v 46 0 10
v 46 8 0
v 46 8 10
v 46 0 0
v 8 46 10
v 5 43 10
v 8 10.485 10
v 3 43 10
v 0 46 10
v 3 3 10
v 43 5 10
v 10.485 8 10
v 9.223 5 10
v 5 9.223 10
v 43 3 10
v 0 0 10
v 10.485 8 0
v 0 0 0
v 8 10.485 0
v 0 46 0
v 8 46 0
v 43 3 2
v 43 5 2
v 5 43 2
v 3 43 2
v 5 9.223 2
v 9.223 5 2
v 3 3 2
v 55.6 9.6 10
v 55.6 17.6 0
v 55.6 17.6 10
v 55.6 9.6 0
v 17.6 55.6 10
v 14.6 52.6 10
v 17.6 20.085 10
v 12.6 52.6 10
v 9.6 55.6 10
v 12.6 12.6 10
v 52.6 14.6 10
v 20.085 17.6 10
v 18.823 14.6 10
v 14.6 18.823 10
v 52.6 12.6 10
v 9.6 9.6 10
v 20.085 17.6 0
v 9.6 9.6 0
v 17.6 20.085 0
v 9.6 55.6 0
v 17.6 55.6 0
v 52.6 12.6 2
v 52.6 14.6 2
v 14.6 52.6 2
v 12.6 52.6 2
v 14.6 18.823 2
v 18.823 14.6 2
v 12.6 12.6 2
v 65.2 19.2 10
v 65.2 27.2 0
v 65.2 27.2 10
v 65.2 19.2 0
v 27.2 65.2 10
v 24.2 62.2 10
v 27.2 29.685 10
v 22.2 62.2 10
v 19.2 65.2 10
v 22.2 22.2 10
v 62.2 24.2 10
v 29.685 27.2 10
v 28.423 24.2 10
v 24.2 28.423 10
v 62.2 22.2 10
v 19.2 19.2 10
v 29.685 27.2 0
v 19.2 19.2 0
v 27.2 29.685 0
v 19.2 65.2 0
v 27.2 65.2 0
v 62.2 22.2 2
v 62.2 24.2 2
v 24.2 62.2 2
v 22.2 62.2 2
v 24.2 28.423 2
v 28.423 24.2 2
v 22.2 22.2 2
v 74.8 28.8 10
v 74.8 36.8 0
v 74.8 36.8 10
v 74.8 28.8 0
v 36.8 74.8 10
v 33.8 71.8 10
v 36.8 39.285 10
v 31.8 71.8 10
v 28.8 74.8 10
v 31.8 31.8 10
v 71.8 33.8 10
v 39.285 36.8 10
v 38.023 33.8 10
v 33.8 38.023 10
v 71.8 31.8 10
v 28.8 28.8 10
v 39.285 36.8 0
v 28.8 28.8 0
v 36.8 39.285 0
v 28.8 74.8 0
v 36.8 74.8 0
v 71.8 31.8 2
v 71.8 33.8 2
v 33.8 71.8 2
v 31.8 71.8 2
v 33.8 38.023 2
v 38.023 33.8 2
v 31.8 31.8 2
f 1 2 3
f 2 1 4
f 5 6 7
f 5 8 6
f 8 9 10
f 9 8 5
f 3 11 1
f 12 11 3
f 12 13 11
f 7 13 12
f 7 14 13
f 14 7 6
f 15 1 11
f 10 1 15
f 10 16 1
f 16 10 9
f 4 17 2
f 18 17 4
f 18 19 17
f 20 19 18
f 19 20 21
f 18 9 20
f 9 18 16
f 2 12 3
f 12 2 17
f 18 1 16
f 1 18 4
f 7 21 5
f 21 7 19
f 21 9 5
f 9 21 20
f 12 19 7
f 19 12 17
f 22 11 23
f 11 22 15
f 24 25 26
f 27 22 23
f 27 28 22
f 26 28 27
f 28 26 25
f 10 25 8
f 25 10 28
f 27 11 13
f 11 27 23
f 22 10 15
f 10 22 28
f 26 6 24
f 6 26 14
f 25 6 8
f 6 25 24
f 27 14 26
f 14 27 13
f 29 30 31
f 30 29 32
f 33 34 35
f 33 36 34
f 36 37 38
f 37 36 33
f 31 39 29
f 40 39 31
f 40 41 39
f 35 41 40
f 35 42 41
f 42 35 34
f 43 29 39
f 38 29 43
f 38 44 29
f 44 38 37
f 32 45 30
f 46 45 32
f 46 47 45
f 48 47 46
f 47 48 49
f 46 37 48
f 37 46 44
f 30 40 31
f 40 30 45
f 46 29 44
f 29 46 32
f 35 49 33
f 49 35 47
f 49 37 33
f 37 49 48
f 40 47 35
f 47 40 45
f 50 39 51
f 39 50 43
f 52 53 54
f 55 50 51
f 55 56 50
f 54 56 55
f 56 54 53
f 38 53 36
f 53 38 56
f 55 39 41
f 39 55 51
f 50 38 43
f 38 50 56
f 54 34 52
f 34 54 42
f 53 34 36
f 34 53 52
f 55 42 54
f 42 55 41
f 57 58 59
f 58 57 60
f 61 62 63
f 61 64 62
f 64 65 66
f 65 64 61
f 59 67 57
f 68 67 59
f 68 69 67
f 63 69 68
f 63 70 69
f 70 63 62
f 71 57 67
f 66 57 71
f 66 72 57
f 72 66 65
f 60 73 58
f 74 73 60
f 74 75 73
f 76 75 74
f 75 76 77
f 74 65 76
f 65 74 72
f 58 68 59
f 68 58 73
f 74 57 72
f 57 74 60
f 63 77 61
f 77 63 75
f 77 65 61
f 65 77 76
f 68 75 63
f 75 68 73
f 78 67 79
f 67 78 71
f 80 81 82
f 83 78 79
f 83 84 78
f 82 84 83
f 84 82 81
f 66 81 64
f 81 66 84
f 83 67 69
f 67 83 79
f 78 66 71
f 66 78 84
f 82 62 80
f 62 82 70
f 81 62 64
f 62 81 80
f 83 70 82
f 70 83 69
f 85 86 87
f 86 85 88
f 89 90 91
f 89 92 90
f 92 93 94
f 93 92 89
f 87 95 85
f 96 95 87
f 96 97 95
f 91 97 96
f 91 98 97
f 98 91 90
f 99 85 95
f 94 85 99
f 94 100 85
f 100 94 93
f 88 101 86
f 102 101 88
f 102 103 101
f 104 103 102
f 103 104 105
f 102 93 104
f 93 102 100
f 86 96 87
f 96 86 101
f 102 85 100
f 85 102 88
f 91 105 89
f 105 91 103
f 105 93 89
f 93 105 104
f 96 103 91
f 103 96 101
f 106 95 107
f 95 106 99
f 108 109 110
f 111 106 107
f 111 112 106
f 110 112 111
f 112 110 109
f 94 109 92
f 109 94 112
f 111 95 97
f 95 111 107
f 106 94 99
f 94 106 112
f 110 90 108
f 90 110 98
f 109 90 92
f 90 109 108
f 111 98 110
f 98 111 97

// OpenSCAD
// ********************************************************
// Edsal Shelf Feet by jcantalupo
// remix by Peter Holzwarth
// ********************************************************

// Length of each leg of the L
L = 40;   // [5:150]

// Thickness of the leg slot
T = 2;    // [1:40]

// Number of feet to print
count= 4; // [1:8]

// Thickness of Bottom
B = 2;    // [2:10]

// Total Height of the foot
H = 10;   // [4:40]

// Thickness of the feet
th=3; // [2:10]

W = T+2*th;
s = L + W - T;

for (a=[1:count]) {
    translate([(a-1)*W*1.2,(a-1)*W*1.2,0]) shelfFoot();
}

module shelfFoot() {
    c= sqrt(2*th*th);
    echo (c);
    difference() {
        union() {
            cube([s,W,H]);
            cube([W,s,H]);
            translate([th+T,th+T,0]) linear_extrude(height = H) 
                polygon( points=[[0,0],[0,2*c],[2*c,0]] );
        }
        translate([(W-T)/2,(s-L)/2,B]) cube([L,T,H-B+0.01]);
        translate([(s-L)/2,(W-T)/2,B]) cube([T,L,H-B+0.01]);
        translate([th+T-0.01,th+T-0.01,B]) linear_extrude(height = H+0.01) 
            polygon( points=[[0,0],[0,c],[c,0]] );
    }
}


// translate([(W-T)/2,(s-L)/2,B]) cube([L,T,10]);
